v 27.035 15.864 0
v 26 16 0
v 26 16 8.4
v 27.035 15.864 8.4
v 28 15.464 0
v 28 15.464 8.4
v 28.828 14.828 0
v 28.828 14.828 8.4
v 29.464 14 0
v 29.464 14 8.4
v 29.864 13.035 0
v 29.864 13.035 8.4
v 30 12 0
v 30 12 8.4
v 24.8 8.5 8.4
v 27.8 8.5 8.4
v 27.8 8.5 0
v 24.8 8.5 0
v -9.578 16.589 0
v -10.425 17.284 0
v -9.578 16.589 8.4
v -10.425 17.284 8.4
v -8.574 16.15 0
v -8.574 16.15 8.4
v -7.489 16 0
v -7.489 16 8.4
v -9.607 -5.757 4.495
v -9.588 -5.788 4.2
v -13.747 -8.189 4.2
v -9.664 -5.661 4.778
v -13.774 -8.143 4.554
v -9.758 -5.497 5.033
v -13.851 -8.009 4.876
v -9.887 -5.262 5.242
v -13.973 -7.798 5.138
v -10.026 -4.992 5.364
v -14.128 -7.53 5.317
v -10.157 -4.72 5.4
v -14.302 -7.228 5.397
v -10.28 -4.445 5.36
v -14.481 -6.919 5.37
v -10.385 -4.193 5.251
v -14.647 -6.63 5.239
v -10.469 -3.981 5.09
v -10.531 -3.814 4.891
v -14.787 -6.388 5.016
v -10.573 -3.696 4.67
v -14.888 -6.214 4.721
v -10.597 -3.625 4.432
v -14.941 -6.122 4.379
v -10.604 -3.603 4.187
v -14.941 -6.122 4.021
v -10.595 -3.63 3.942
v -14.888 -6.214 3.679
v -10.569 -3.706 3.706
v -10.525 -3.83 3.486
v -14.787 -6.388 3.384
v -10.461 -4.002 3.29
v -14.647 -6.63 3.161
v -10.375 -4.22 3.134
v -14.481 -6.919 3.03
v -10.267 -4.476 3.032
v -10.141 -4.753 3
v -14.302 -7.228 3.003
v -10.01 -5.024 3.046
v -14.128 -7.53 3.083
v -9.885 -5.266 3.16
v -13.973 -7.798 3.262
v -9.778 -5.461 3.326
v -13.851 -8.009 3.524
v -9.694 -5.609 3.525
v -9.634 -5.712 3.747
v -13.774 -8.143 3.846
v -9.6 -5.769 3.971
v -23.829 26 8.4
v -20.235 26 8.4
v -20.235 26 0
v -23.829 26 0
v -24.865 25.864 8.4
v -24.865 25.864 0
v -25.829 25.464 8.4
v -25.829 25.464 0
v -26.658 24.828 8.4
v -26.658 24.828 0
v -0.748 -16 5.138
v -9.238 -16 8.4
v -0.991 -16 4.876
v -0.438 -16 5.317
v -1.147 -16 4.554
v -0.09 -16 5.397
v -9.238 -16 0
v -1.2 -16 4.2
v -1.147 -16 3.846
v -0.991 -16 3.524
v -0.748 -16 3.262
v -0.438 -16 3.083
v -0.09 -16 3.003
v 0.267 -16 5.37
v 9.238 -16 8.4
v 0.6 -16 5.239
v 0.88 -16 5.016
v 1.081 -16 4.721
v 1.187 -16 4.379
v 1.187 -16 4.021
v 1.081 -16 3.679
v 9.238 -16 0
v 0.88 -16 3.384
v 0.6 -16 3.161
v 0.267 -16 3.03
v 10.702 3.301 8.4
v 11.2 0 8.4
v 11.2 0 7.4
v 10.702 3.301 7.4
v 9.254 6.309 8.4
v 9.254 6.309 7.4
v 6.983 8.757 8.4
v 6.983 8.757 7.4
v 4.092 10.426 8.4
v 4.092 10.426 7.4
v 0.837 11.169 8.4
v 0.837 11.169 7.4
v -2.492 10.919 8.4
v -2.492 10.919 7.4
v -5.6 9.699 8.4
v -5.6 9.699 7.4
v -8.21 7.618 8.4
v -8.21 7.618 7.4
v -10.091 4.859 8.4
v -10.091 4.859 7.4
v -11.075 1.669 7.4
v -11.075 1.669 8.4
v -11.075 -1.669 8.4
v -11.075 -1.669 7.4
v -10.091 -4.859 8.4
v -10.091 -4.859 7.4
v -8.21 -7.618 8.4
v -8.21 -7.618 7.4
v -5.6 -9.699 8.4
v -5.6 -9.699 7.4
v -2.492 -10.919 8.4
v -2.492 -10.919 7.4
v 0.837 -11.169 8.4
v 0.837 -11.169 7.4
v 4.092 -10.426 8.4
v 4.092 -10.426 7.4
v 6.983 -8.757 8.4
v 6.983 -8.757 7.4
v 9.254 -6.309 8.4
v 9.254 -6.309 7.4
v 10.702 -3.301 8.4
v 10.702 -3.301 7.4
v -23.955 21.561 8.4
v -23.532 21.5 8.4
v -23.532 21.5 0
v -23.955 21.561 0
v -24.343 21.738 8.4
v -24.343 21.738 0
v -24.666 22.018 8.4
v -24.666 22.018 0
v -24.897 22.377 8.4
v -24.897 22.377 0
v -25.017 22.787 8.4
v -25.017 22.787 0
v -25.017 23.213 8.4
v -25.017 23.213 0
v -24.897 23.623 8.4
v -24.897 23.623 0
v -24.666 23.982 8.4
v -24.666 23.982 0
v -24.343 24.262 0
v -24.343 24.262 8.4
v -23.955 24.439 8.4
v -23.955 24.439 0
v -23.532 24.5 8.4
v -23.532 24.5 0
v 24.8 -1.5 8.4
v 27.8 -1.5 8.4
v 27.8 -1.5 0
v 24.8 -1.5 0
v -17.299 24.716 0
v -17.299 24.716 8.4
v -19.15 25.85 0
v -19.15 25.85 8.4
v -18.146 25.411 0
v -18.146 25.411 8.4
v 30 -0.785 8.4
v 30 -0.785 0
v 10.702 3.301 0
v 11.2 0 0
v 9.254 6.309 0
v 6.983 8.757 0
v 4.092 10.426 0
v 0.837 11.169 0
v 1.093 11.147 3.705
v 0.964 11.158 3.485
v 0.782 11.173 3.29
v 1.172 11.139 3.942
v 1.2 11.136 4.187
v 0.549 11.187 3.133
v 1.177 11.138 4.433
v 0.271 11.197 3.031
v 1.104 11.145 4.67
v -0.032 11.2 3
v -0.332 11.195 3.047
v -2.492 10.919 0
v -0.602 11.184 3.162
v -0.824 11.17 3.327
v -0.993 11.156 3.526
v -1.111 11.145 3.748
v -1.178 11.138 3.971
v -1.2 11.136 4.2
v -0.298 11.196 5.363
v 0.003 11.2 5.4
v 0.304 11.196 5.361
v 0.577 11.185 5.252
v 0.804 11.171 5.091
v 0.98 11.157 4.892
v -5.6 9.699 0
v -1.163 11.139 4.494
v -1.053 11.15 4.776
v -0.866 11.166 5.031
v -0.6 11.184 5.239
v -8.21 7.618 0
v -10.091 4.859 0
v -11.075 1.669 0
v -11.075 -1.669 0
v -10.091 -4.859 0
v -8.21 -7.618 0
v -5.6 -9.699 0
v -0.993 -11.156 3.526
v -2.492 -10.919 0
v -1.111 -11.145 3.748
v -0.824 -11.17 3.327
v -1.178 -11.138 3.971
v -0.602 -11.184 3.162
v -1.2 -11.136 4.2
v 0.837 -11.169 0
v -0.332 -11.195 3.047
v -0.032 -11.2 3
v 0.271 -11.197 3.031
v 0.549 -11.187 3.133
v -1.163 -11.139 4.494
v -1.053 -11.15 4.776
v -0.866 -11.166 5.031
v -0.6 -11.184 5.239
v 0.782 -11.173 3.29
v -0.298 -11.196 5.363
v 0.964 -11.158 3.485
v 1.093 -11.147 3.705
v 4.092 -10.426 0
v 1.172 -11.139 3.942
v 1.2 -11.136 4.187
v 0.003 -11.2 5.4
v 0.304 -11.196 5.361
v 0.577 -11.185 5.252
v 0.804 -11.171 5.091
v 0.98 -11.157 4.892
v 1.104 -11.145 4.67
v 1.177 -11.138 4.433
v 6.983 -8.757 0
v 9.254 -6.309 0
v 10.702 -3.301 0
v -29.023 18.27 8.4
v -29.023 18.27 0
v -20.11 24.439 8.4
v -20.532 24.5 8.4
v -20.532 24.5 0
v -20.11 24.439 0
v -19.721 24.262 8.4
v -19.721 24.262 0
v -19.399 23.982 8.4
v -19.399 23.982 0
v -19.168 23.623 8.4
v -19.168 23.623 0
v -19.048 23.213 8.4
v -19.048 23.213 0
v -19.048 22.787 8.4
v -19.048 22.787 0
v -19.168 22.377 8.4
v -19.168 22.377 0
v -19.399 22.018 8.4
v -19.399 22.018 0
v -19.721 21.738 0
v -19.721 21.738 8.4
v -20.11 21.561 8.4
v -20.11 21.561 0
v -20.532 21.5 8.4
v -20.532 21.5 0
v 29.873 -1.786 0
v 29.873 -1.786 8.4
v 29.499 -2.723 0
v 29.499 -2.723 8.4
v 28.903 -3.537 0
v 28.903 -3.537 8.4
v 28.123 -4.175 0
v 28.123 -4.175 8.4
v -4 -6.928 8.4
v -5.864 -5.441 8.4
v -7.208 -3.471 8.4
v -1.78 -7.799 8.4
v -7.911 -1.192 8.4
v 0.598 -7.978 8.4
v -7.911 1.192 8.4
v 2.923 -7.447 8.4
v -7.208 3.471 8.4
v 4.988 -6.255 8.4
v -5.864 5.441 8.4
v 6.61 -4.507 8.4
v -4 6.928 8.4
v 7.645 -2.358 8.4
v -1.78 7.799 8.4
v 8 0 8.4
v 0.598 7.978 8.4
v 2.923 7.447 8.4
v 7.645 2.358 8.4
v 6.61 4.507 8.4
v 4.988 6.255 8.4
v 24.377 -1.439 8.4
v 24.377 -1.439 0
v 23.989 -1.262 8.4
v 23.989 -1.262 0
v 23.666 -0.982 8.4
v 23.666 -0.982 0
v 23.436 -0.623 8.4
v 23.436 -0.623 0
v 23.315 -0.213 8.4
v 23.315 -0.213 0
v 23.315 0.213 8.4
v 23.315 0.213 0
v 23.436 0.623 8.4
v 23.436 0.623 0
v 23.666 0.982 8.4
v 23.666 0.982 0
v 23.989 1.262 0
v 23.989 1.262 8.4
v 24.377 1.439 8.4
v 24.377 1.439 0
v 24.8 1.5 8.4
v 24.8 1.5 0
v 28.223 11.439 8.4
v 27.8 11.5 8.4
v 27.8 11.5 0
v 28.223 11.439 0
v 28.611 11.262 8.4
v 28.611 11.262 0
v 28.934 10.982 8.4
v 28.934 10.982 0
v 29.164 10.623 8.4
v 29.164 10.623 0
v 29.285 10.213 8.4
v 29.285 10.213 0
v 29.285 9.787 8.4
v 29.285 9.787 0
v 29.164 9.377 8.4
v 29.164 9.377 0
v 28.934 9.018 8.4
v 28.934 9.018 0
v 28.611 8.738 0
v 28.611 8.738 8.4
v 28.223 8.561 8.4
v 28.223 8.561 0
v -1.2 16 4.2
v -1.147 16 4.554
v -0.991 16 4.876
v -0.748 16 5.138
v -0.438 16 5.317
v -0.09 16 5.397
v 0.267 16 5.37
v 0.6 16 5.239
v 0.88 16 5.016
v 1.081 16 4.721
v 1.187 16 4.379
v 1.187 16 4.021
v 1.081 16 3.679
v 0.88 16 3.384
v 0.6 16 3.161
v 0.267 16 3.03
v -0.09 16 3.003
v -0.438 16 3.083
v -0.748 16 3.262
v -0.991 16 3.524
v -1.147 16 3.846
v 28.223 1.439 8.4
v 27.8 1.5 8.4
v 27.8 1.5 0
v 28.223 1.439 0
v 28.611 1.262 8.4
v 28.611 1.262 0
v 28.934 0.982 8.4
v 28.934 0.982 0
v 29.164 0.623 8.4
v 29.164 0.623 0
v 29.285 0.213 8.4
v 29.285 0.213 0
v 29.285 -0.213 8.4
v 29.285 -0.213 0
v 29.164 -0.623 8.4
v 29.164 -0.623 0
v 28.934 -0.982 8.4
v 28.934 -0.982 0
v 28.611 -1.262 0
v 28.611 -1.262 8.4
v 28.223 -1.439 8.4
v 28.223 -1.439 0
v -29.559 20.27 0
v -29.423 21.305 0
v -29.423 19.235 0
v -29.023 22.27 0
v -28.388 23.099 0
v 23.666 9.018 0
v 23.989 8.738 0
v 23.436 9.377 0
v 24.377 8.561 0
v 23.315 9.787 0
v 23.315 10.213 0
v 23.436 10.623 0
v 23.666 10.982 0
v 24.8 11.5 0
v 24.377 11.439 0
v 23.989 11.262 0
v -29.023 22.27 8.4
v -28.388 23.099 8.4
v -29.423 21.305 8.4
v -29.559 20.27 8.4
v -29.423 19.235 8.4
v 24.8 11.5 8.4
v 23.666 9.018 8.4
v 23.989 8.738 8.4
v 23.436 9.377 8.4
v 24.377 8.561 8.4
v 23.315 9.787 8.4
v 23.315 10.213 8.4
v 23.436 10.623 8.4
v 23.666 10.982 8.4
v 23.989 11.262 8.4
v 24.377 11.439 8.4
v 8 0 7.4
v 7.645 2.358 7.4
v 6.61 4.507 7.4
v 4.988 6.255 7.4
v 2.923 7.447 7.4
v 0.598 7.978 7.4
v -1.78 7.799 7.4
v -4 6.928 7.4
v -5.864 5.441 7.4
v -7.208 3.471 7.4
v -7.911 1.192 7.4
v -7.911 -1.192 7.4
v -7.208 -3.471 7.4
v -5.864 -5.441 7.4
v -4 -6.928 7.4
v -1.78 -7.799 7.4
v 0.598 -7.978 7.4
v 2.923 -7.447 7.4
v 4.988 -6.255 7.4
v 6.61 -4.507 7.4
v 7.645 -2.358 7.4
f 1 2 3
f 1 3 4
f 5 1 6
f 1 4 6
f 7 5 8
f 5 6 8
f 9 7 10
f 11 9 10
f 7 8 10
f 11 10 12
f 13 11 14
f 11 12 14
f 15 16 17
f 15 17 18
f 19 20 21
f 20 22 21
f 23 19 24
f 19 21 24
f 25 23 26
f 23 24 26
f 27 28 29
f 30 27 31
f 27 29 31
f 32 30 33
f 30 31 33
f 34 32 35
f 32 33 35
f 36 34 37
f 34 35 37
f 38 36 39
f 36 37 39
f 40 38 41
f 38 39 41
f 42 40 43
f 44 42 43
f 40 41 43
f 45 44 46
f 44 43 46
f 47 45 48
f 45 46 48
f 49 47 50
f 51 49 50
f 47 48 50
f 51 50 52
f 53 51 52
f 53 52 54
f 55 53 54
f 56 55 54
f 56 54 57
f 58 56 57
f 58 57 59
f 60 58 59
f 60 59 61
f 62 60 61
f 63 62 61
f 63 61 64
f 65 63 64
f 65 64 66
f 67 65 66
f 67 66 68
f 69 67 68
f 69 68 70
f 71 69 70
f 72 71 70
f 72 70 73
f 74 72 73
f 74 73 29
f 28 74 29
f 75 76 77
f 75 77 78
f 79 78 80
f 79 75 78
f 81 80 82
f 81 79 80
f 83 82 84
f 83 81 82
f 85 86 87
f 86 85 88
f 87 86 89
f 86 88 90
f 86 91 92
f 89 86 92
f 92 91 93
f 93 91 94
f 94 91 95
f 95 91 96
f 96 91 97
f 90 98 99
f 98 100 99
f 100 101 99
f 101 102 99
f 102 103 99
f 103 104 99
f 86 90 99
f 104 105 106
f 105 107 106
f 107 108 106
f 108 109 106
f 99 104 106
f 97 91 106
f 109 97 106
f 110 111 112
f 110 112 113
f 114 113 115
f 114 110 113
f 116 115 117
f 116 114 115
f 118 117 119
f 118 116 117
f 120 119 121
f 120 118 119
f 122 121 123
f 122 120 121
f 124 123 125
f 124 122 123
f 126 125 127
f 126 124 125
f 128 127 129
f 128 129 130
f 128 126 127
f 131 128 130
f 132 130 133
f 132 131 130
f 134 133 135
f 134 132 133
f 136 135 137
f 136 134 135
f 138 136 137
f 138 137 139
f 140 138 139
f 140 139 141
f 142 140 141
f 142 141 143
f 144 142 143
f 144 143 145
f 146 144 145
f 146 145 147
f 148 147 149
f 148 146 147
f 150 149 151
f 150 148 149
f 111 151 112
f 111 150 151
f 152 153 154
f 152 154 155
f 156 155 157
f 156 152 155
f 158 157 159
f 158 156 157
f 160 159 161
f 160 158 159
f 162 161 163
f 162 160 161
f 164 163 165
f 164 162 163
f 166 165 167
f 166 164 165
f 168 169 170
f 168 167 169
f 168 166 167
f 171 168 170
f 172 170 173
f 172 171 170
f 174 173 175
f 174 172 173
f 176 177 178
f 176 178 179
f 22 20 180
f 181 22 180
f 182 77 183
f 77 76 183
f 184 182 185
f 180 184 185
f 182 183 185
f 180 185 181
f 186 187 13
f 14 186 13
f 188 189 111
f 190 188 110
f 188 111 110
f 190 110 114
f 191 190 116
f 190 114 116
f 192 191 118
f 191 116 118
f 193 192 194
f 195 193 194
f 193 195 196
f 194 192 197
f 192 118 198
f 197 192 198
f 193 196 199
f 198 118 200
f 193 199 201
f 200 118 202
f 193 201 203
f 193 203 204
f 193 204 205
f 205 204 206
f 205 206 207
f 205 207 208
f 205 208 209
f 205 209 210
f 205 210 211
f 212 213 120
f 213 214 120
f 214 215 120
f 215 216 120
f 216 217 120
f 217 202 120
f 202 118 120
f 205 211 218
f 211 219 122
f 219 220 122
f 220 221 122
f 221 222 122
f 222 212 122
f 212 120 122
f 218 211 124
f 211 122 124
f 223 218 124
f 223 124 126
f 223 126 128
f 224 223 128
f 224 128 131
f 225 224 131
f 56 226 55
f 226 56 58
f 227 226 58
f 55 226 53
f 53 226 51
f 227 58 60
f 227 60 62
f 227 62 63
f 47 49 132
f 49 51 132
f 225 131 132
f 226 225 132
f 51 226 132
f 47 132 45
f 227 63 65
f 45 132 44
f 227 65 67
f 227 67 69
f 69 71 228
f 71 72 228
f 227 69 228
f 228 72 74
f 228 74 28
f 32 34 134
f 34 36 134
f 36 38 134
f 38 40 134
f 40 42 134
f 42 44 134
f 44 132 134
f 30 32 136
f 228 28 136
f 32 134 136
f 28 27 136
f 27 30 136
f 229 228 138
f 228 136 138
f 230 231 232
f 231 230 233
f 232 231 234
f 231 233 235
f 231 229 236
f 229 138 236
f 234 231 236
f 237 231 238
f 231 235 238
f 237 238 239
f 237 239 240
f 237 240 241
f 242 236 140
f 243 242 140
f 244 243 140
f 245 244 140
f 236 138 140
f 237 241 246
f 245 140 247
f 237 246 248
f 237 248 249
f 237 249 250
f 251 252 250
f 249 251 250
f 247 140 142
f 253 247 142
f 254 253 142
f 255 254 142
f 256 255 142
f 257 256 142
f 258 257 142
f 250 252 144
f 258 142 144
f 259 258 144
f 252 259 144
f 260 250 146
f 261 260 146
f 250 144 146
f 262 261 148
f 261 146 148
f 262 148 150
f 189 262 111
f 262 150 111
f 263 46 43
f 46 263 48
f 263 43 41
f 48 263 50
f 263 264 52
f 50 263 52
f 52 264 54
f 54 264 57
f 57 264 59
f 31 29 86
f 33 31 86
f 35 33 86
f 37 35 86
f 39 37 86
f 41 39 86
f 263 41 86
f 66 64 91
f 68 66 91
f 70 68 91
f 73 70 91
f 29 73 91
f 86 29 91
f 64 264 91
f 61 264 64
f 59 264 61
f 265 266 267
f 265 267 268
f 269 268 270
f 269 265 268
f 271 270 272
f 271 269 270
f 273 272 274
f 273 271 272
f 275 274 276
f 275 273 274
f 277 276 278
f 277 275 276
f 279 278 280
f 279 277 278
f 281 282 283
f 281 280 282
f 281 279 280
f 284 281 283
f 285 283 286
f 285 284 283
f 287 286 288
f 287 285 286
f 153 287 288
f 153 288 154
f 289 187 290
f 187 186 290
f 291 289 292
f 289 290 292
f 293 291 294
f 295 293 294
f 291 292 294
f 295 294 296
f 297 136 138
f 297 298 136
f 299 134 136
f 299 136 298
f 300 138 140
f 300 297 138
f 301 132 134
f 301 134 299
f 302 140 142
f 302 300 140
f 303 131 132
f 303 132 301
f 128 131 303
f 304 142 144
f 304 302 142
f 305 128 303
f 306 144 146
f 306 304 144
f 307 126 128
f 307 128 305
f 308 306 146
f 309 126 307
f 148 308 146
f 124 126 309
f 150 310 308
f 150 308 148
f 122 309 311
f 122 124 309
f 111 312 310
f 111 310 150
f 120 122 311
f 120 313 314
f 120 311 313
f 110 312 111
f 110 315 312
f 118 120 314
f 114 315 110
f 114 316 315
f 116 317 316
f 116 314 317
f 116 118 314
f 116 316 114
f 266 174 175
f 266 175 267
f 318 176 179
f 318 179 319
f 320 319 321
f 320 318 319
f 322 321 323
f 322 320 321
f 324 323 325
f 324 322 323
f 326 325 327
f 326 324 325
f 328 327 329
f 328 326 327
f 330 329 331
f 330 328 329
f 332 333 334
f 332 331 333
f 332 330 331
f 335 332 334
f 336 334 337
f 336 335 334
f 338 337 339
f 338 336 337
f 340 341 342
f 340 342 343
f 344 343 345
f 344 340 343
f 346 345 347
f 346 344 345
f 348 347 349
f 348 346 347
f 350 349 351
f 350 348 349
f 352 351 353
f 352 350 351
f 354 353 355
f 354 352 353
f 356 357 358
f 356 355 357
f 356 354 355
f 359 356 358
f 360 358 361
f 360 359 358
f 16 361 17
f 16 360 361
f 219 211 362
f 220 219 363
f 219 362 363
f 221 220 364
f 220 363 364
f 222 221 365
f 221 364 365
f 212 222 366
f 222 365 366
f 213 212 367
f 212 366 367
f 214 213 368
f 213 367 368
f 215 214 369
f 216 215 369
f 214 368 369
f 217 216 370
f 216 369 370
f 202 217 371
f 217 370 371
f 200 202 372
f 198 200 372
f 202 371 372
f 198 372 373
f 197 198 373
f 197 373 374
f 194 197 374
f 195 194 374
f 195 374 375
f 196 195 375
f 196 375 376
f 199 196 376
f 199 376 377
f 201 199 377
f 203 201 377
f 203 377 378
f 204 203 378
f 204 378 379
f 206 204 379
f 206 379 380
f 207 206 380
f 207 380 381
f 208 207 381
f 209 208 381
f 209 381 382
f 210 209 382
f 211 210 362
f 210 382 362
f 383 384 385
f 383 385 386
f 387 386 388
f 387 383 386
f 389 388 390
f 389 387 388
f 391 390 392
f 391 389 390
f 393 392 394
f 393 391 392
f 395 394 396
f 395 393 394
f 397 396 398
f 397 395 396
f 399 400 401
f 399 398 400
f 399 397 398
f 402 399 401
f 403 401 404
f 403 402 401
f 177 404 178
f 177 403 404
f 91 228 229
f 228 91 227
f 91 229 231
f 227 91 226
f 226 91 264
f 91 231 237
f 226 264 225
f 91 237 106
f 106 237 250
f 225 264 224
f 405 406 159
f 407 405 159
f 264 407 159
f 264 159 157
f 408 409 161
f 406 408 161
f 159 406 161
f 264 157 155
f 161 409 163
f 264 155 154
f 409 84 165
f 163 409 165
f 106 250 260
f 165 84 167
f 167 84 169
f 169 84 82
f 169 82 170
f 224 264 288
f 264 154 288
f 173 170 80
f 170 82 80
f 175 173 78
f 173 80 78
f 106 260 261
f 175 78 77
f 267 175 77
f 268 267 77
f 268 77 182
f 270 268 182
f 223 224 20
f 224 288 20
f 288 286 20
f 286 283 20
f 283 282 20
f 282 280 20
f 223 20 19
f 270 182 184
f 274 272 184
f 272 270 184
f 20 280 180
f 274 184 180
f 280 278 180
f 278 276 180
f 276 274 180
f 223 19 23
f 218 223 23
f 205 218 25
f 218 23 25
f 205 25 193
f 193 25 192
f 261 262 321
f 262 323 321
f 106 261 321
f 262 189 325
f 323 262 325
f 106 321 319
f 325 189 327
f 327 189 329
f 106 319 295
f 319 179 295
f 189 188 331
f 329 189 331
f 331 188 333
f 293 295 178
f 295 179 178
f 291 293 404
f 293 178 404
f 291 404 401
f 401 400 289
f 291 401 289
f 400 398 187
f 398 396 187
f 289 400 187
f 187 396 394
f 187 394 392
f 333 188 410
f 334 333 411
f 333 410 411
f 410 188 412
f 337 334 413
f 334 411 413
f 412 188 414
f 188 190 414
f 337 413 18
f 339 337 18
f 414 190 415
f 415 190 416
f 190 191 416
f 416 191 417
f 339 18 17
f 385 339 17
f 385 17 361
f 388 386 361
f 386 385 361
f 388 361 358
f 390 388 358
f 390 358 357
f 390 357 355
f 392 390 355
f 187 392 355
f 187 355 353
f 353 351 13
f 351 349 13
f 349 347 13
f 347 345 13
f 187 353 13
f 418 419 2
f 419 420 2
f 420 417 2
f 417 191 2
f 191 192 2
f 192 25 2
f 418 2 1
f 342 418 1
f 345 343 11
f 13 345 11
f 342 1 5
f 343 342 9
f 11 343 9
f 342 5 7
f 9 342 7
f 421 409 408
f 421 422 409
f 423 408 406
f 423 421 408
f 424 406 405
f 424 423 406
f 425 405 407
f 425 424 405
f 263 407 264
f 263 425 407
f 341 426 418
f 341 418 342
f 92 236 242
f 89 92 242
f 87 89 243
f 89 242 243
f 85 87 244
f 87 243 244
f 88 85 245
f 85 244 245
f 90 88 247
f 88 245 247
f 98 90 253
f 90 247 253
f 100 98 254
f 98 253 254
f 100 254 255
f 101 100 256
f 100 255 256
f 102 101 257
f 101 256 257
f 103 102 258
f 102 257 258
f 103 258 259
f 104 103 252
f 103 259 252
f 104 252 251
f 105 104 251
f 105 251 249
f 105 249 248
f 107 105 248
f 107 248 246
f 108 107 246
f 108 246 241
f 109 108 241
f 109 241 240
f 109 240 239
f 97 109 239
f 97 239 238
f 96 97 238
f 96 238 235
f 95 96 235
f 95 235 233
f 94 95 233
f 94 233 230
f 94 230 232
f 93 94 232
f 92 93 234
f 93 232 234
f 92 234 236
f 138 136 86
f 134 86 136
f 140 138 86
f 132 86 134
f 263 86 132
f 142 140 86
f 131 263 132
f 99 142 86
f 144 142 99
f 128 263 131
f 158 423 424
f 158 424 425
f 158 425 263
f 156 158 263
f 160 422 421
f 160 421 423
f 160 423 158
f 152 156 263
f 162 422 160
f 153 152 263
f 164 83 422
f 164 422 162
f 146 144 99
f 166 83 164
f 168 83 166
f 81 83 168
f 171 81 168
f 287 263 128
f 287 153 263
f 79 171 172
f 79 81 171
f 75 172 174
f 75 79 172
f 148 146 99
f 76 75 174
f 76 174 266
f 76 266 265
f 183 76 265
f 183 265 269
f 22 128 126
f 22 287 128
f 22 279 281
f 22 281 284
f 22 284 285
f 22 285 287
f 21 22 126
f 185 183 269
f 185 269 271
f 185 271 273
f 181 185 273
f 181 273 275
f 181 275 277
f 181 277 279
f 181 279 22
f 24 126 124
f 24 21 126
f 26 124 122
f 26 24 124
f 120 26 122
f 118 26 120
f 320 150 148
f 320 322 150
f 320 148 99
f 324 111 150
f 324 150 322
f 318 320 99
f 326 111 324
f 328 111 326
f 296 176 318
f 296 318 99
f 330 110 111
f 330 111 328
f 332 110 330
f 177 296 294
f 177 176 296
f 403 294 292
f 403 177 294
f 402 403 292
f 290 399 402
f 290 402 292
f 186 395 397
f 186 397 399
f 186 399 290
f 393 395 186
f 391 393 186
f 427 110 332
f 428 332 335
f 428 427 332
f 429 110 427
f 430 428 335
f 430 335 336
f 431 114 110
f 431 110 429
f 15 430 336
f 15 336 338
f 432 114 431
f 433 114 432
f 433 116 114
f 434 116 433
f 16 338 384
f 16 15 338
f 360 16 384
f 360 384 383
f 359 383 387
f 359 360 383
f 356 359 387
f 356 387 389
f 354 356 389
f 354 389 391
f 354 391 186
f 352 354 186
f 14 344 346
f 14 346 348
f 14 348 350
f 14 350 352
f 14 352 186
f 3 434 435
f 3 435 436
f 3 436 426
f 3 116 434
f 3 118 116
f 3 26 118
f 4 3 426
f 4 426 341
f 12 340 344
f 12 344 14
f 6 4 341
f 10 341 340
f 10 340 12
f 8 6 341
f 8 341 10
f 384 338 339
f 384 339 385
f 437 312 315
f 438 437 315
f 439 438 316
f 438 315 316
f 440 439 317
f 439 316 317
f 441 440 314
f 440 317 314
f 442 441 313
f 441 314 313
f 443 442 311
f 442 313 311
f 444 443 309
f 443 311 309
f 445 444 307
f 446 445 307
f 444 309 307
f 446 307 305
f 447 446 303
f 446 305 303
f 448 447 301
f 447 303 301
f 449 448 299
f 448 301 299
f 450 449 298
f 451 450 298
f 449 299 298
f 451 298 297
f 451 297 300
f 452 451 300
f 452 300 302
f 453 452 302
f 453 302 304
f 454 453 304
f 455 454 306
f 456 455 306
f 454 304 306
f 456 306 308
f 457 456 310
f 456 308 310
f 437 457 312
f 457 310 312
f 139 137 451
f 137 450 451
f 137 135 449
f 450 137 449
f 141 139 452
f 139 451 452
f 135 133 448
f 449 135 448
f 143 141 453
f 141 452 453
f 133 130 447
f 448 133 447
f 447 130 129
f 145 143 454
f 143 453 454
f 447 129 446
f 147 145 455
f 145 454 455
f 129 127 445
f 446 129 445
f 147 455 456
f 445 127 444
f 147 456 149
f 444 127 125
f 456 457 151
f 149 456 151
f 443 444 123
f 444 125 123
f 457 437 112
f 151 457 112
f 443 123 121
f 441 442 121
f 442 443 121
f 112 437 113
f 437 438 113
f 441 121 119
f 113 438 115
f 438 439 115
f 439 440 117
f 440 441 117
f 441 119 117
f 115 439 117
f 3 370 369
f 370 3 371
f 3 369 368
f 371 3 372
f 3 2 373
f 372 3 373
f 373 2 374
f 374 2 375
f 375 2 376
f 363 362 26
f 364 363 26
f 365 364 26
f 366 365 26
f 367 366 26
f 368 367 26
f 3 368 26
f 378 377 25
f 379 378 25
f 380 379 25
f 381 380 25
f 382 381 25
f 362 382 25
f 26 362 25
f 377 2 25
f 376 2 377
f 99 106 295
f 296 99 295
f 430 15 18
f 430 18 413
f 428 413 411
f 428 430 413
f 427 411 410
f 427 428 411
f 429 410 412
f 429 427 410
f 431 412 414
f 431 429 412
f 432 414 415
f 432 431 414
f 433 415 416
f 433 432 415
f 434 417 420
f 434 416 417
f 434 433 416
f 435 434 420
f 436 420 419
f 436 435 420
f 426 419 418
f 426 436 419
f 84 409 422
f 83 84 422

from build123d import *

# Parameters (mm, degrees)
DODANIE_WYCI_GNI_CIE1_DEPTH = 8.4
SZKIC2_R                    = 11.2
WYTNIJ_WYCI_GNI_CIE1_DEPTH  = 44.219131566
SZKIC3_R                    = 1.2
WYTNIJ_WYCI_GNI_CIE2_DEPTH  = 48.073276212
SZKIC4_R                    = 1.2
WYTNIJ_WYCI_GNI_CIE3_DEPTH  = 10
SZKIC5_R                    = 11.2
SZKIC5_R_2                  = 8
DODANIE_WYCI_GNI_CIE2_DEPTH = 1
SFAZOWANIE1_SIZE            = 8
SFAZOWANIE1_SIZE2           = 5.856406461
ZAOKR_GLENIE2_R             = 4
WYTNIJ_WYCI_GNI_CIE4_DEPTH  = 41.577826478


with BuildPart() as part:
    # Szkic1 → Dodanie-wyciągnięcie1 (new body)
    with BuildSketch(Plane.XY):
        Polygon((30, 16), (-9.237604307, 16), (-18.486315613, 26), (-33.486315613, 26), (-9.237604307, -16), (9.237604307, -16), (30, -3), align=None)
    extrude(amount=DODANIE_WYCI_GNI_CIE1_DEPTH)

    # Szkic2 → Wytnij-wyciągnięcie1 (cut, through all)
    with BuildSketch(Plane.XY.offset(8.4)):
        Circle(SZKIC2_R)
    extrude(amount=-WYTNIJ_WYCI_GNI_CIE1_DEPTH, mode=Mode.SUBTRACT)

    # Szkic3 → Wytnij-wyciągnięcie2 (cut, through all)
    with BuildSketch(Plane(origin=(0, 16, 0), x_dir=(1, 0, 0), z_dir=(0, 1, 0))):
        with Locations(Location((0, -4.2, 0), (0, 0, 180))):
            Circle(SZKIC3_R)
    extrude(amount=-WYTNIJ_WYCI_GNI_CIE2_DEPTH, mode=Mode.SUBTRACT)

    # Szkic4 → Wytnij-wyciągnięcie3 (cut)
    with BuildSketch(Plane(origin=(-13.856406461, -8, 0), x_dir=(0, 0, 1), z_dir=(-0.8660254037844386, -0.5, 0))):
        with Locations(Location((4.2, 0.981596763, 0), (0, 0, 270))):
            Circle(SZKIC4_R)
    extrude(amount=-WYTNIJ_WYCI_GNI_CIE3_DEPTH, mode=Mode.SUBTRACT)

    # Sfazowanie1
    sfazowanie1_edges = [part.edges().sort_by_distance(p)[0] for p in [
        (-33.486315613, 26, 4.2),
    ]]
    sfazowanie1_side = [part.faces().sort_by_distance(p)[0] for p in [
        (-25.986315613, 26, 4.2),
    ]]
    chamfer(sfazowanie1_edges, length=SFAZOWANIE1_SIZE, length2=SFAZOWANIE1_SIZE2, reference=sfazowanie1_side[0])

    # Zaokrąglenie2
    zaokr_glenie2_edges = [part.edges().sort_by_distance(p)[0] for p in [
        (30, -3, 4.2),
        (-18.486315613, 26, 4.2),
        (-9.237604307, 16, 4.2),
        (30, 16, 4.2),
        (-30.558112383, 20.92820323, 4.2),
        (-25.486315613, 26, 4.2),
    ]]
    fillet(zaokr_glenie2_edges, radius=ZAOKR_GLENIE2_R)

    # Szkic6 → Wytnij-wyciągnięcie4 (cut, through all)
    with BuildSketch(Plane.XY.offset(8.4)):
        with BuildLine():
            Line((24.8, 1.5), (27.8, 1.5))
            ThreePointArc((27.8, 1.5), (29.3, 0), (27.8, -1.5))
            Line((27.8, -1.5), (24.8, -1.5))
            ThreePointArc((24.8, -1.5), (23.3, 0), (24.8, 1.5))
        make_face()
        with BuildLine():
            Line((24.8, 11.5), (27.8, 11.5))
            ThreePointArc((27.8, 11.5), (29.3, 10), (27.8, 8.5))
            Line((27.8, 8.5), (24.8, 8.5))
            ThreePointArc((24.8, 8.5), (23.3, 10), (24.8, 11.5))
        make_face()
        with BuildLine():
            Line((-23.532397763, 24.5), (-20.532397763, 24.5))
            ThreePointArc((-20.532397763, 24.5), (-19.032397763, 23), (-20.532397763, 21.5))
            Line((-20.532397763, 21.5), (-23.532397763, 21.5))
            ThreePointArc((-23.532397763, 21.5), (-25.032397763, 23), (-23.532397763, 24.5))
        make_face()
    extrude(amount=-WYTNIJ_WYCI_GNI_CIE4_DEPTH, mode=Mode.SUBTRACT)


with BuildPart() as body_2:
    # Szkic5 → Dodanie-wyciągnięcie2 (new body)
    with BuildSketch(Plane.XY.offset(8.4)):
        Circle(SZKIC5_R)
        Circle(SZKIC5_R_2, mode=Mode.SUBTRACT)
    extrude(amount=-DODANIE_WYCI_GNI_CIE2_DEPTH)


solid = Compound([part.part, body_2.part])
